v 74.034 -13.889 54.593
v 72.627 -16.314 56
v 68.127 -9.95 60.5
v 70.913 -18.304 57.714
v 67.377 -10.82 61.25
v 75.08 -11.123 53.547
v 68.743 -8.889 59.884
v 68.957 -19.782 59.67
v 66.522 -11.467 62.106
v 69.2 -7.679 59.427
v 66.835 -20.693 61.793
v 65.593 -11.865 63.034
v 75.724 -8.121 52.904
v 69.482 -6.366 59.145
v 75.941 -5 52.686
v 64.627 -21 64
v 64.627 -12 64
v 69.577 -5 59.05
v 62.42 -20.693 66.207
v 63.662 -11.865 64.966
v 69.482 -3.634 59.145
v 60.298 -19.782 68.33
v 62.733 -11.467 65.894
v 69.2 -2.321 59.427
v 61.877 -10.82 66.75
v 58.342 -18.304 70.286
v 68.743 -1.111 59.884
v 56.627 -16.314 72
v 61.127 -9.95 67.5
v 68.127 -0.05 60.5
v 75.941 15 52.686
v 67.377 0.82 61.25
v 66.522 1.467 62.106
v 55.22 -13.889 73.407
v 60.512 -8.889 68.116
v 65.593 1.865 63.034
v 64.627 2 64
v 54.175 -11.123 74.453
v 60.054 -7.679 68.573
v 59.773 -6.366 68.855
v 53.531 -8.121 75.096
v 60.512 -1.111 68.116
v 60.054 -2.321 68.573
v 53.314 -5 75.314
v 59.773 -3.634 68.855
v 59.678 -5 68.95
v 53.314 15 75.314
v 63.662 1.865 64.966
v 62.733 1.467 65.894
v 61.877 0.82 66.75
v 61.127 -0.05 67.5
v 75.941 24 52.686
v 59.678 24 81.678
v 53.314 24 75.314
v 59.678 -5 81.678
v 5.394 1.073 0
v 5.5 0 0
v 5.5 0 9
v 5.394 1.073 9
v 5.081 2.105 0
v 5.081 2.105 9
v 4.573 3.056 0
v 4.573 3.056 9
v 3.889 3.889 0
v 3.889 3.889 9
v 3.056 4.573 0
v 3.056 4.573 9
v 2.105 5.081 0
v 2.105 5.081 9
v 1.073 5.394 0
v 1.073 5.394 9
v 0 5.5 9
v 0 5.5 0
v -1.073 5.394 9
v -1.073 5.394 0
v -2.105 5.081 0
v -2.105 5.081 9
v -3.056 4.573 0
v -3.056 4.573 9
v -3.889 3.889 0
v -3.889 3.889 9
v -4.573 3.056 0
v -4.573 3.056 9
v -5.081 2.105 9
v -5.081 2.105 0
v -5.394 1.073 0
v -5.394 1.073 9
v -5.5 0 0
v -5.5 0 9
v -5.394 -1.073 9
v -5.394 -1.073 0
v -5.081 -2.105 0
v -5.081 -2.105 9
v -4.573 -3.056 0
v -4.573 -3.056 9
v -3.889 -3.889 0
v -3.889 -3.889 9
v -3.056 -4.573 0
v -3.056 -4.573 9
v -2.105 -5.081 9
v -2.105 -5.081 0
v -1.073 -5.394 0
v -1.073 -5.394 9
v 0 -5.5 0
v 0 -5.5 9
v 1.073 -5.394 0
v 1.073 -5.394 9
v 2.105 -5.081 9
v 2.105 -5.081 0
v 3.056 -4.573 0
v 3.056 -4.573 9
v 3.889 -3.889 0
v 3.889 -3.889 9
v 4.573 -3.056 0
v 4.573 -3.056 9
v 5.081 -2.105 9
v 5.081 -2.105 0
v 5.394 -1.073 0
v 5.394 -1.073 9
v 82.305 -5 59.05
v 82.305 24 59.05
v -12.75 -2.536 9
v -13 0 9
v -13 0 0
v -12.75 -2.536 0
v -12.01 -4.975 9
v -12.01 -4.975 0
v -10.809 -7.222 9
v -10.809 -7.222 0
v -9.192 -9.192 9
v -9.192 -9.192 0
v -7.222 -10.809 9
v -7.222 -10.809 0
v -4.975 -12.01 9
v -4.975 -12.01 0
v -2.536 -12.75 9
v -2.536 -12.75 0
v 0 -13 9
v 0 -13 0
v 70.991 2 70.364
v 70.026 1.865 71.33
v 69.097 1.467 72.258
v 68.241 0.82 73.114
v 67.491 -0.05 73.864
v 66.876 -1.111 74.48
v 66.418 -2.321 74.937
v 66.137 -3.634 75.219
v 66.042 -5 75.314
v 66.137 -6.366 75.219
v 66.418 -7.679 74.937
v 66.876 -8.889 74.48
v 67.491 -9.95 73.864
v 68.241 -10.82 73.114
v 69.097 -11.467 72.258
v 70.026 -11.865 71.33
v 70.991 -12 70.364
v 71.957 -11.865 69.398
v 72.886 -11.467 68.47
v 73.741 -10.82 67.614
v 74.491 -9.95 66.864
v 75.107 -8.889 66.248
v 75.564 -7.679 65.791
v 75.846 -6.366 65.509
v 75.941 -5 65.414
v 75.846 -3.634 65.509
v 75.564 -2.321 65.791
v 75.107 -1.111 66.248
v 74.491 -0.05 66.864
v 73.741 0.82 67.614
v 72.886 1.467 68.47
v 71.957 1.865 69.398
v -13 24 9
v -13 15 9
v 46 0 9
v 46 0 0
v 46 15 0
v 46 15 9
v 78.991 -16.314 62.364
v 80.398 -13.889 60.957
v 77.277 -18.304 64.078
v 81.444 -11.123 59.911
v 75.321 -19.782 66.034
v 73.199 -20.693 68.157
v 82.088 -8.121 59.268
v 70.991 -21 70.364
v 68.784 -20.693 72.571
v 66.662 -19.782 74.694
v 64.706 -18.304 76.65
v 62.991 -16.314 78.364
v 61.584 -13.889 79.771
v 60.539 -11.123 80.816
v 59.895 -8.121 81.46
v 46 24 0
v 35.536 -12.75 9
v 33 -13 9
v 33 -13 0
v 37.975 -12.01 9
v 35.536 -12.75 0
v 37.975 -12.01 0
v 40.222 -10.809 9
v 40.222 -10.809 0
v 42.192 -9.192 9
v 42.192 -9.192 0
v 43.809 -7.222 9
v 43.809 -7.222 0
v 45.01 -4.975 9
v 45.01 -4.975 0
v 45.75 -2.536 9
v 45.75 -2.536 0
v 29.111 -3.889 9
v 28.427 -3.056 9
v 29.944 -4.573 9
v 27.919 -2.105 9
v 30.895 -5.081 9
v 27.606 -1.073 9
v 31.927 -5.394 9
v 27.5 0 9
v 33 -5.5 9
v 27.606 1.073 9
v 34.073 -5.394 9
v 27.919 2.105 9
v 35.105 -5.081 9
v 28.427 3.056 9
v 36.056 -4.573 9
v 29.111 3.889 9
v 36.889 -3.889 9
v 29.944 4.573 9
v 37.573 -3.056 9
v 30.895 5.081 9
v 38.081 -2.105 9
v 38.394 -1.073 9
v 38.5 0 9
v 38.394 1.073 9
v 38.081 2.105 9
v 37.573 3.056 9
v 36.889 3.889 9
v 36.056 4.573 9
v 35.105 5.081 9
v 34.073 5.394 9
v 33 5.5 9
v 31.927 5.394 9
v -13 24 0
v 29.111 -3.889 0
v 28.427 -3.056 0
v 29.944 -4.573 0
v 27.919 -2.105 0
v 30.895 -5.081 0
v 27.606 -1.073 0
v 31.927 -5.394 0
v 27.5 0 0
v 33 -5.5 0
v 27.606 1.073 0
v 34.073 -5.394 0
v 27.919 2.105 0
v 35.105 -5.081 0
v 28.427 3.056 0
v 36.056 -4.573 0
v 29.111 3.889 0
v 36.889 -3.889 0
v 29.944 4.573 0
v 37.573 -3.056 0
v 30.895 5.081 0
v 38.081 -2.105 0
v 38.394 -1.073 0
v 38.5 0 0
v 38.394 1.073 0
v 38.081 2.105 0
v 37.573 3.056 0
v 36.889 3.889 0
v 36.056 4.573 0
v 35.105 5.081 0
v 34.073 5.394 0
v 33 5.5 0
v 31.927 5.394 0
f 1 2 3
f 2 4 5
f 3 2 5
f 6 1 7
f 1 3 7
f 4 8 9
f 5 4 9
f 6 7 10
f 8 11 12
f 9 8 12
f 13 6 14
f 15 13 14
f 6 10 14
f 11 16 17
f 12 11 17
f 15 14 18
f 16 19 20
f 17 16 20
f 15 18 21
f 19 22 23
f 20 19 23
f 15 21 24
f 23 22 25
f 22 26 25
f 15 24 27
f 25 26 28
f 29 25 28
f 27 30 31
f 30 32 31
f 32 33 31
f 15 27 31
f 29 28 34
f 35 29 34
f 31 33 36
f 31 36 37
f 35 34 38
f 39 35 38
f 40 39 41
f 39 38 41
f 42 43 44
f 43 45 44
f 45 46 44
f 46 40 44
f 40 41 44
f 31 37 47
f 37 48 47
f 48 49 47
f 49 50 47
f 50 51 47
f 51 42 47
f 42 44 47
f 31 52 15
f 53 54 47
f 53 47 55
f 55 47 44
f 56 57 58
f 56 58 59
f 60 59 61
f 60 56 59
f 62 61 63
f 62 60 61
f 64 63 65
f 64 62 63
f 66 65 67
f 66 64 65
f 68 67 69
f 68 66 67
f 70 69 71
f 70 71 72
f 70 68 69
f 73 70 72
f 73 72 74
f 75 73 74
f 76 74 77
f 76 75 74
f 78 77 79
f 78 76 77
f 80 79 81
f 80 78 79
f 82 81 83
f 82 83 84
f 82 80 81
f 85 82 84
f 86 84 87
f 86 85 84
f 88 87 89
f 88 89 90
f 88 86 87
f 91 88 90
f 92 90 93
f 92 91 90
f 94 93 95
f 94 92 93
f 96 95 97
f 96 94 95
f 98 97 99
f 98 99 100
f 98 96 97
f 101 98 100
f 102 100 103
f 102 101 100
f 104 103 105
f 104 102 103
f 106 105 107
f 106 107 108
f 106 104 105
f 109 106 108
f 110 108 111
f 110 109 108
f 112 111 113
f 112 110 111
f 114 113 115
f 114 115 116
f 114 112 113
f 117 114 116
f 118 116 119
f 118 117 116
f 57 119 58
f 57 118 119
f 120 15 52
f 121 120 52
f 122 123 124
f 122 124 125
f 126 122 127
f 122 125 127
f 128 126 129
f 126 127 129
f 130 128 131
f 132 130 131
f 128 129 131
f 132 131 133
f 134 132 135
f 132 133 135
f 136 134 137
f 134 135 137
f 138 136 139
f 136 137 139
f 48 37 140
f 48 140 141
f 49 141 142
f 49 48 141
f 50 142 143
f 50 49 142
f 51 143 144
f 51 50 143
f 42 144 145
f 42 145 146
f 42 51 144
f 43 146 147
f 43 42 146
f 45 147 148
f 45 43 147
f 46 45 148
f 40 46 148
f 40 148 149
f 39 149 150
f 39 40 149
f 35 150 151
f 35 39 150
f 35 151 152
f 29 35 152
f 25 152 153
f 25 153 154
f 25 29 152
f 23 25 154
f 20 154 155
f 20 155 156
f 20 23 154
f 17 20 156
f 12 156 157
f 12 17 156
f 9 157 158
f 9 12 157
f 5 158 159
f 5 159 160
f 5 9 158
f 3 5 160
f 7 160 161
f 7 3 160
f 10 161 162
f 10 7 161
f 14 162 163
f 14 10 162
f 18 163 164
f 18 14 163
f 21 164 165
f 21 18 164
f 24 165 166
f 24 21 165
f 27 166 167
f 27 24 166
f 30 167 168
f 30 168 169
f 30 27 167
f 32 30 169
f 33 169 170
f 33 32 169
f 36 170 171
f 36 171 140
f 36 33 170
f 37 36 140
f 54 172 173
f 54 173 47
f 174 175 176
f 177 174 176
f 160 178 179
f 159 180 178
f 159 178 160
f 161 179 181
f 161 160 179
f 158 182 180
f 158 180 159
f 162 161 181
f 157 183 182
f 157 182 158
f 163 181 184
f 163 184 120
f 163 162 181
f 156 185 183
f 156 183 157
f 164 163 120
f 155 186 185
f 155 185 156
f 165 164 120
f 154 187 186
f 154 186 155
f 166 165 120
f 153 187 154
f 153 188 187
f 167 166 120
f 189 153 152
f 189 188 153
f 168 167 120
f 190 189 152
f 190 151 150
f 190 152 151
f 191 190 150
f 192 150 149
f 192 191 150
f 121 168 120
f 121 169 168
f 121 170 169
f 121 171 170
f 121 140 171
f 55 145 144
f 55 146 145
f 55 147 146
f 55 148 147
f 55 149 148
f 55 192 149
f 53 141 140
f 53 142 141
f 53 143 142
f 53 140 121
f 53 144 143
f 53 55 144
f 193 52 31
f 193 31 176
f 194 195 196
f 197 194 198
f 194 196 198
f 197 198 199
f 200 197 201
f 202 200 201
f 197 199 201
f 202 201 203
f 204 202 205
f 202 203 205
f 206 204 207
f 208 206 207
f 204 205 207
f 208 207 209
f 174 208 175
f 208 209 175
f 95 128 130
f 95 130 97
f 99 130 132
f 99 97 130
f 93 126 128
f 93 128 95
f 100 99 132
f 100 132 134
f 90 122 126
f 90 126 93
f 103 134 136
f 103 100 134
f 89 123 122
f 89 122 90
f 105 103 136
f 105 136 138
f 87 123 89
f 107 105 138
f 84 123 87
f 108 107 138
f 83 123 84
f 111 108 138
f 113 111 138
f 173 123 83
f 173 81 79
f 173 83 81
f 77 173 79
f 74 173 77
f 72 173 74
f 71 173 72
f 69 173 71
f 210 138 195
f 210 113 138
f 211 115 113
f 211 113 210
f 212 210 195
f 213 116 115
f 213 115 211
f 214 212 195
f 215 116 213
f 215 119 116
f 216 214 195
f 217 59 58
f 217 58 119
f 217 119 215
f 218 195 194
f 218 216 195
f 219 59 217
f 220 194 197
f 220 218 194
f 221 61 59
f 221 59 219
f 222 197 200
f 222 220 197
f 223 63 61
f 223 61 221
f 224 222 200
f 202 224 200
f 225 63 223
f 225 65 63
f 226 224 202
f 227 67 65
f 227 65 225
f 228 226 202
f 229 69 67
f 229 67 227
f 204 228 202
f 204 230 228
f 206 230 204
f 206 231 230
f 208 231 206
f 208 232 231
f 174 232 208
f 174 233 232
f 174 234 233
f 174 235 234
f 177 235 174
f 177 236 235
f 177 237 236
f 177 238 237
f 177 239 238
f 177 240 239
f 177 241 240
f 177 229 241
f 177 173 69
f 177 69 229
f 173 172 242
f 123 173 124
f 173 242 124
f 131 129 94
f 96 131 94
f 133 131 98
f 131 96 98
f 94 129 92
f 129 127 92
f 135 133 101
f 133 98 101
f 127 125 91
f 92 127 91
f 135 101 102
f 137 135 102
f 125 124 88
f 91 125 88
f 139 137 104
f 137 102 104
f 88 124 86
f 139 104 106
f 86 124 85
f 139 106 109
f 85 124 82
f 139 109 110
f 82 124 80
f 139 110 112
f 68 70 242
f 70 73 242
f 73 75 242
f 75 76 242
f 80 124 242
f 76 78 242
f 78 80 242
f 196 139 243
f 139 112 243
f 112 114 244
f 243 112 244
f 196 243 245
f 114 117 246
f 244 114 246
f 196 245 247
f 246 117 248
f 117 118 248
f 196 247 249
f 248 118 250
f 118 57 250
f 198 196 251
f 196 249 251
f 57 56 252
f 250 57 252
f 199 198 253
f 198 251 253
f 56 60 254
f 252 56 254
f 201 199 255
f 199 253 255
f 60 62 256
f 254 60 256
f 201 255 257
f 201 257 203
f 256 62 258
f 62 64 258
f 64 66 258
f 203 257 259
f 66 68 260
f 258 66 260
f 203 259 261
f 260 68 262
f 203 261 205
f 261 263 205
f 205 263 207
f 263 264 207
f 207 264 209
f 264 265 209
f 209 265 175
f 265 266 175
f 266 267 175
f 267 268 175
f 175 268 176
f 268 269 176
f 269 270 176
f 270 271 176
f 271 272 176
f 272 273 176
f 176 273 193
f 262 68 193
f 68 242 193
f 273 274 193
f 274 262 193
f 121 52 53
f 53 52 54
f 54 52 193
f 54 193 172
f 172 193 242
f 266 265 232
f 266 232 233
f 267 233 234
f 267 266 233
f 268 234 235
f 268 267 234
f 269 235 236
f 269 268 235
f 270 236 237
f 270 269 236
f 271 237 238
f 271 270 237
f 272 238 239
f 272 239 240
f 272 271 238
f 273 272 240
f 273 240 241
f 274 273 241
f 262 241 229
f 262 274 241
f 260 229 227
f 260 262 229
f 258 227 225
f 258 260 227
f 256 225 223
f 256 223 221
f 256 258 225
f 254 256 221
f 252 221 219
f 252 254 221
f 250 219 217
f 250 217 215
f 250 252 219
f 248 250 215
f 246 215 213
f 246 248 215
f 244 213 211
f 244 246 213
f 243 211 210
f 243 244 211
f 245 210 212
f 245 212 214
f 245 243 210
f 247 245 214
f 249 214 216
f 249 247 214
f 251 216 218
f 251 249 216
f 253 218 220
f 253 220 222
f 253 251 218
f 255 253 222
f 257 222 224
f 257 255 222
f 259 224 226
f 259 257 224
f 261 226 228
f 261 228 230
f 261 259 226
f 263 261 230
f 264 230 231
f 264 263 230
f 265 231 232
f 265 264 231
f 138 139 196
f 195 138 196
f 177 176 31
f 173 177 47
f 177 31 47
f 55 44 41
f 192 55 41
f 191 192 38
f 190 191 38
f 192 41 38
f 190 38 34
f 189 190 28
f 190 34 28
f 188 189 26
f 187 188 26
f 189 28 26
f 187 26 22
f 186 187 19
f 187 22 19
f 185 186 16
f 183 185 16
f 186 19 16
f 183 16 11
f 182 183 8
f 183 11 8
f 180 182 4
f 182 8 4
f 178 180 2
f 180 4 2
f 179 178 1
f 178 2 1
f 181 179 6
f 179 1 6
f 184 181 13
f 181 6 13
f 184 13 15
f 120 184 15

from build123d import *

# Parameters (mm, degrees)
F0_R     = 5.5
F1_DEPTH = 9
F3_DEPTH = 9
F4_R     = 7
F5_DEPTH = 9


with BuildPart() as f1:
    # F0 (on Top) → F1 (new body)
    with BuildSketch(Plane.XY):
        with BuildLine():
            Line((46, 24), (-13, 24))
            Line((-13, 24), (-13, 0))
            ThreePointArc((-13, 0), (-9.192388, -9.192388), (0, -13))
            Line((0, -13), (33, -13))
            ThreePointArc((33, -13), (42.192388, -9.192388), (46, 0))
            Line((46, 0), (46, 24))
        make_face()
        Circle(F0_R, mode=Mode.SUBTRACT)
        with Locations((33, 0)):
            Circle(F0_R, mode=Mode.SUBTRACT)
    extrude(amount=F1_DEPTH)

    # F2 (on face) → F3 (join)
    with BuildSketch(Plane(origin=(0, 24, 0), x_dir=(-1, 0, 0), z_dir=(0, 1, 0))):
        Polygon((-46, 9), (13, 9), (-53.313708, 75.313708), (-75.941125, 52.686292), (-46, 0), align=None)
    extrude(amount=-F3_DEPTH)

    # F4 (on face) → F5 (join)
    with BuildSketch(Plane(origin=(64.313708, 0, 64.313708), x_dir=(0, 1, 0), z_dir=(0.707107, 0, 0.707107))):
        with BuildLine():
            Line((24, -16.443651), (24, 15.556349))
            Line((24, 15.556349), (-5, 15.556349))
            ThreePointArc((-5, 15.556349), (-21, -0.443651), (-5, -16.443651))
            Line((-5, -16.443651), (24, -16.443651))
        make_face()
        with Locations((-5, -0.443651)):
            Circle(F4_R, mode=Mode.SUBTRACT)
    extrude(amount=F5_DEPTH)


solid = f1.part
